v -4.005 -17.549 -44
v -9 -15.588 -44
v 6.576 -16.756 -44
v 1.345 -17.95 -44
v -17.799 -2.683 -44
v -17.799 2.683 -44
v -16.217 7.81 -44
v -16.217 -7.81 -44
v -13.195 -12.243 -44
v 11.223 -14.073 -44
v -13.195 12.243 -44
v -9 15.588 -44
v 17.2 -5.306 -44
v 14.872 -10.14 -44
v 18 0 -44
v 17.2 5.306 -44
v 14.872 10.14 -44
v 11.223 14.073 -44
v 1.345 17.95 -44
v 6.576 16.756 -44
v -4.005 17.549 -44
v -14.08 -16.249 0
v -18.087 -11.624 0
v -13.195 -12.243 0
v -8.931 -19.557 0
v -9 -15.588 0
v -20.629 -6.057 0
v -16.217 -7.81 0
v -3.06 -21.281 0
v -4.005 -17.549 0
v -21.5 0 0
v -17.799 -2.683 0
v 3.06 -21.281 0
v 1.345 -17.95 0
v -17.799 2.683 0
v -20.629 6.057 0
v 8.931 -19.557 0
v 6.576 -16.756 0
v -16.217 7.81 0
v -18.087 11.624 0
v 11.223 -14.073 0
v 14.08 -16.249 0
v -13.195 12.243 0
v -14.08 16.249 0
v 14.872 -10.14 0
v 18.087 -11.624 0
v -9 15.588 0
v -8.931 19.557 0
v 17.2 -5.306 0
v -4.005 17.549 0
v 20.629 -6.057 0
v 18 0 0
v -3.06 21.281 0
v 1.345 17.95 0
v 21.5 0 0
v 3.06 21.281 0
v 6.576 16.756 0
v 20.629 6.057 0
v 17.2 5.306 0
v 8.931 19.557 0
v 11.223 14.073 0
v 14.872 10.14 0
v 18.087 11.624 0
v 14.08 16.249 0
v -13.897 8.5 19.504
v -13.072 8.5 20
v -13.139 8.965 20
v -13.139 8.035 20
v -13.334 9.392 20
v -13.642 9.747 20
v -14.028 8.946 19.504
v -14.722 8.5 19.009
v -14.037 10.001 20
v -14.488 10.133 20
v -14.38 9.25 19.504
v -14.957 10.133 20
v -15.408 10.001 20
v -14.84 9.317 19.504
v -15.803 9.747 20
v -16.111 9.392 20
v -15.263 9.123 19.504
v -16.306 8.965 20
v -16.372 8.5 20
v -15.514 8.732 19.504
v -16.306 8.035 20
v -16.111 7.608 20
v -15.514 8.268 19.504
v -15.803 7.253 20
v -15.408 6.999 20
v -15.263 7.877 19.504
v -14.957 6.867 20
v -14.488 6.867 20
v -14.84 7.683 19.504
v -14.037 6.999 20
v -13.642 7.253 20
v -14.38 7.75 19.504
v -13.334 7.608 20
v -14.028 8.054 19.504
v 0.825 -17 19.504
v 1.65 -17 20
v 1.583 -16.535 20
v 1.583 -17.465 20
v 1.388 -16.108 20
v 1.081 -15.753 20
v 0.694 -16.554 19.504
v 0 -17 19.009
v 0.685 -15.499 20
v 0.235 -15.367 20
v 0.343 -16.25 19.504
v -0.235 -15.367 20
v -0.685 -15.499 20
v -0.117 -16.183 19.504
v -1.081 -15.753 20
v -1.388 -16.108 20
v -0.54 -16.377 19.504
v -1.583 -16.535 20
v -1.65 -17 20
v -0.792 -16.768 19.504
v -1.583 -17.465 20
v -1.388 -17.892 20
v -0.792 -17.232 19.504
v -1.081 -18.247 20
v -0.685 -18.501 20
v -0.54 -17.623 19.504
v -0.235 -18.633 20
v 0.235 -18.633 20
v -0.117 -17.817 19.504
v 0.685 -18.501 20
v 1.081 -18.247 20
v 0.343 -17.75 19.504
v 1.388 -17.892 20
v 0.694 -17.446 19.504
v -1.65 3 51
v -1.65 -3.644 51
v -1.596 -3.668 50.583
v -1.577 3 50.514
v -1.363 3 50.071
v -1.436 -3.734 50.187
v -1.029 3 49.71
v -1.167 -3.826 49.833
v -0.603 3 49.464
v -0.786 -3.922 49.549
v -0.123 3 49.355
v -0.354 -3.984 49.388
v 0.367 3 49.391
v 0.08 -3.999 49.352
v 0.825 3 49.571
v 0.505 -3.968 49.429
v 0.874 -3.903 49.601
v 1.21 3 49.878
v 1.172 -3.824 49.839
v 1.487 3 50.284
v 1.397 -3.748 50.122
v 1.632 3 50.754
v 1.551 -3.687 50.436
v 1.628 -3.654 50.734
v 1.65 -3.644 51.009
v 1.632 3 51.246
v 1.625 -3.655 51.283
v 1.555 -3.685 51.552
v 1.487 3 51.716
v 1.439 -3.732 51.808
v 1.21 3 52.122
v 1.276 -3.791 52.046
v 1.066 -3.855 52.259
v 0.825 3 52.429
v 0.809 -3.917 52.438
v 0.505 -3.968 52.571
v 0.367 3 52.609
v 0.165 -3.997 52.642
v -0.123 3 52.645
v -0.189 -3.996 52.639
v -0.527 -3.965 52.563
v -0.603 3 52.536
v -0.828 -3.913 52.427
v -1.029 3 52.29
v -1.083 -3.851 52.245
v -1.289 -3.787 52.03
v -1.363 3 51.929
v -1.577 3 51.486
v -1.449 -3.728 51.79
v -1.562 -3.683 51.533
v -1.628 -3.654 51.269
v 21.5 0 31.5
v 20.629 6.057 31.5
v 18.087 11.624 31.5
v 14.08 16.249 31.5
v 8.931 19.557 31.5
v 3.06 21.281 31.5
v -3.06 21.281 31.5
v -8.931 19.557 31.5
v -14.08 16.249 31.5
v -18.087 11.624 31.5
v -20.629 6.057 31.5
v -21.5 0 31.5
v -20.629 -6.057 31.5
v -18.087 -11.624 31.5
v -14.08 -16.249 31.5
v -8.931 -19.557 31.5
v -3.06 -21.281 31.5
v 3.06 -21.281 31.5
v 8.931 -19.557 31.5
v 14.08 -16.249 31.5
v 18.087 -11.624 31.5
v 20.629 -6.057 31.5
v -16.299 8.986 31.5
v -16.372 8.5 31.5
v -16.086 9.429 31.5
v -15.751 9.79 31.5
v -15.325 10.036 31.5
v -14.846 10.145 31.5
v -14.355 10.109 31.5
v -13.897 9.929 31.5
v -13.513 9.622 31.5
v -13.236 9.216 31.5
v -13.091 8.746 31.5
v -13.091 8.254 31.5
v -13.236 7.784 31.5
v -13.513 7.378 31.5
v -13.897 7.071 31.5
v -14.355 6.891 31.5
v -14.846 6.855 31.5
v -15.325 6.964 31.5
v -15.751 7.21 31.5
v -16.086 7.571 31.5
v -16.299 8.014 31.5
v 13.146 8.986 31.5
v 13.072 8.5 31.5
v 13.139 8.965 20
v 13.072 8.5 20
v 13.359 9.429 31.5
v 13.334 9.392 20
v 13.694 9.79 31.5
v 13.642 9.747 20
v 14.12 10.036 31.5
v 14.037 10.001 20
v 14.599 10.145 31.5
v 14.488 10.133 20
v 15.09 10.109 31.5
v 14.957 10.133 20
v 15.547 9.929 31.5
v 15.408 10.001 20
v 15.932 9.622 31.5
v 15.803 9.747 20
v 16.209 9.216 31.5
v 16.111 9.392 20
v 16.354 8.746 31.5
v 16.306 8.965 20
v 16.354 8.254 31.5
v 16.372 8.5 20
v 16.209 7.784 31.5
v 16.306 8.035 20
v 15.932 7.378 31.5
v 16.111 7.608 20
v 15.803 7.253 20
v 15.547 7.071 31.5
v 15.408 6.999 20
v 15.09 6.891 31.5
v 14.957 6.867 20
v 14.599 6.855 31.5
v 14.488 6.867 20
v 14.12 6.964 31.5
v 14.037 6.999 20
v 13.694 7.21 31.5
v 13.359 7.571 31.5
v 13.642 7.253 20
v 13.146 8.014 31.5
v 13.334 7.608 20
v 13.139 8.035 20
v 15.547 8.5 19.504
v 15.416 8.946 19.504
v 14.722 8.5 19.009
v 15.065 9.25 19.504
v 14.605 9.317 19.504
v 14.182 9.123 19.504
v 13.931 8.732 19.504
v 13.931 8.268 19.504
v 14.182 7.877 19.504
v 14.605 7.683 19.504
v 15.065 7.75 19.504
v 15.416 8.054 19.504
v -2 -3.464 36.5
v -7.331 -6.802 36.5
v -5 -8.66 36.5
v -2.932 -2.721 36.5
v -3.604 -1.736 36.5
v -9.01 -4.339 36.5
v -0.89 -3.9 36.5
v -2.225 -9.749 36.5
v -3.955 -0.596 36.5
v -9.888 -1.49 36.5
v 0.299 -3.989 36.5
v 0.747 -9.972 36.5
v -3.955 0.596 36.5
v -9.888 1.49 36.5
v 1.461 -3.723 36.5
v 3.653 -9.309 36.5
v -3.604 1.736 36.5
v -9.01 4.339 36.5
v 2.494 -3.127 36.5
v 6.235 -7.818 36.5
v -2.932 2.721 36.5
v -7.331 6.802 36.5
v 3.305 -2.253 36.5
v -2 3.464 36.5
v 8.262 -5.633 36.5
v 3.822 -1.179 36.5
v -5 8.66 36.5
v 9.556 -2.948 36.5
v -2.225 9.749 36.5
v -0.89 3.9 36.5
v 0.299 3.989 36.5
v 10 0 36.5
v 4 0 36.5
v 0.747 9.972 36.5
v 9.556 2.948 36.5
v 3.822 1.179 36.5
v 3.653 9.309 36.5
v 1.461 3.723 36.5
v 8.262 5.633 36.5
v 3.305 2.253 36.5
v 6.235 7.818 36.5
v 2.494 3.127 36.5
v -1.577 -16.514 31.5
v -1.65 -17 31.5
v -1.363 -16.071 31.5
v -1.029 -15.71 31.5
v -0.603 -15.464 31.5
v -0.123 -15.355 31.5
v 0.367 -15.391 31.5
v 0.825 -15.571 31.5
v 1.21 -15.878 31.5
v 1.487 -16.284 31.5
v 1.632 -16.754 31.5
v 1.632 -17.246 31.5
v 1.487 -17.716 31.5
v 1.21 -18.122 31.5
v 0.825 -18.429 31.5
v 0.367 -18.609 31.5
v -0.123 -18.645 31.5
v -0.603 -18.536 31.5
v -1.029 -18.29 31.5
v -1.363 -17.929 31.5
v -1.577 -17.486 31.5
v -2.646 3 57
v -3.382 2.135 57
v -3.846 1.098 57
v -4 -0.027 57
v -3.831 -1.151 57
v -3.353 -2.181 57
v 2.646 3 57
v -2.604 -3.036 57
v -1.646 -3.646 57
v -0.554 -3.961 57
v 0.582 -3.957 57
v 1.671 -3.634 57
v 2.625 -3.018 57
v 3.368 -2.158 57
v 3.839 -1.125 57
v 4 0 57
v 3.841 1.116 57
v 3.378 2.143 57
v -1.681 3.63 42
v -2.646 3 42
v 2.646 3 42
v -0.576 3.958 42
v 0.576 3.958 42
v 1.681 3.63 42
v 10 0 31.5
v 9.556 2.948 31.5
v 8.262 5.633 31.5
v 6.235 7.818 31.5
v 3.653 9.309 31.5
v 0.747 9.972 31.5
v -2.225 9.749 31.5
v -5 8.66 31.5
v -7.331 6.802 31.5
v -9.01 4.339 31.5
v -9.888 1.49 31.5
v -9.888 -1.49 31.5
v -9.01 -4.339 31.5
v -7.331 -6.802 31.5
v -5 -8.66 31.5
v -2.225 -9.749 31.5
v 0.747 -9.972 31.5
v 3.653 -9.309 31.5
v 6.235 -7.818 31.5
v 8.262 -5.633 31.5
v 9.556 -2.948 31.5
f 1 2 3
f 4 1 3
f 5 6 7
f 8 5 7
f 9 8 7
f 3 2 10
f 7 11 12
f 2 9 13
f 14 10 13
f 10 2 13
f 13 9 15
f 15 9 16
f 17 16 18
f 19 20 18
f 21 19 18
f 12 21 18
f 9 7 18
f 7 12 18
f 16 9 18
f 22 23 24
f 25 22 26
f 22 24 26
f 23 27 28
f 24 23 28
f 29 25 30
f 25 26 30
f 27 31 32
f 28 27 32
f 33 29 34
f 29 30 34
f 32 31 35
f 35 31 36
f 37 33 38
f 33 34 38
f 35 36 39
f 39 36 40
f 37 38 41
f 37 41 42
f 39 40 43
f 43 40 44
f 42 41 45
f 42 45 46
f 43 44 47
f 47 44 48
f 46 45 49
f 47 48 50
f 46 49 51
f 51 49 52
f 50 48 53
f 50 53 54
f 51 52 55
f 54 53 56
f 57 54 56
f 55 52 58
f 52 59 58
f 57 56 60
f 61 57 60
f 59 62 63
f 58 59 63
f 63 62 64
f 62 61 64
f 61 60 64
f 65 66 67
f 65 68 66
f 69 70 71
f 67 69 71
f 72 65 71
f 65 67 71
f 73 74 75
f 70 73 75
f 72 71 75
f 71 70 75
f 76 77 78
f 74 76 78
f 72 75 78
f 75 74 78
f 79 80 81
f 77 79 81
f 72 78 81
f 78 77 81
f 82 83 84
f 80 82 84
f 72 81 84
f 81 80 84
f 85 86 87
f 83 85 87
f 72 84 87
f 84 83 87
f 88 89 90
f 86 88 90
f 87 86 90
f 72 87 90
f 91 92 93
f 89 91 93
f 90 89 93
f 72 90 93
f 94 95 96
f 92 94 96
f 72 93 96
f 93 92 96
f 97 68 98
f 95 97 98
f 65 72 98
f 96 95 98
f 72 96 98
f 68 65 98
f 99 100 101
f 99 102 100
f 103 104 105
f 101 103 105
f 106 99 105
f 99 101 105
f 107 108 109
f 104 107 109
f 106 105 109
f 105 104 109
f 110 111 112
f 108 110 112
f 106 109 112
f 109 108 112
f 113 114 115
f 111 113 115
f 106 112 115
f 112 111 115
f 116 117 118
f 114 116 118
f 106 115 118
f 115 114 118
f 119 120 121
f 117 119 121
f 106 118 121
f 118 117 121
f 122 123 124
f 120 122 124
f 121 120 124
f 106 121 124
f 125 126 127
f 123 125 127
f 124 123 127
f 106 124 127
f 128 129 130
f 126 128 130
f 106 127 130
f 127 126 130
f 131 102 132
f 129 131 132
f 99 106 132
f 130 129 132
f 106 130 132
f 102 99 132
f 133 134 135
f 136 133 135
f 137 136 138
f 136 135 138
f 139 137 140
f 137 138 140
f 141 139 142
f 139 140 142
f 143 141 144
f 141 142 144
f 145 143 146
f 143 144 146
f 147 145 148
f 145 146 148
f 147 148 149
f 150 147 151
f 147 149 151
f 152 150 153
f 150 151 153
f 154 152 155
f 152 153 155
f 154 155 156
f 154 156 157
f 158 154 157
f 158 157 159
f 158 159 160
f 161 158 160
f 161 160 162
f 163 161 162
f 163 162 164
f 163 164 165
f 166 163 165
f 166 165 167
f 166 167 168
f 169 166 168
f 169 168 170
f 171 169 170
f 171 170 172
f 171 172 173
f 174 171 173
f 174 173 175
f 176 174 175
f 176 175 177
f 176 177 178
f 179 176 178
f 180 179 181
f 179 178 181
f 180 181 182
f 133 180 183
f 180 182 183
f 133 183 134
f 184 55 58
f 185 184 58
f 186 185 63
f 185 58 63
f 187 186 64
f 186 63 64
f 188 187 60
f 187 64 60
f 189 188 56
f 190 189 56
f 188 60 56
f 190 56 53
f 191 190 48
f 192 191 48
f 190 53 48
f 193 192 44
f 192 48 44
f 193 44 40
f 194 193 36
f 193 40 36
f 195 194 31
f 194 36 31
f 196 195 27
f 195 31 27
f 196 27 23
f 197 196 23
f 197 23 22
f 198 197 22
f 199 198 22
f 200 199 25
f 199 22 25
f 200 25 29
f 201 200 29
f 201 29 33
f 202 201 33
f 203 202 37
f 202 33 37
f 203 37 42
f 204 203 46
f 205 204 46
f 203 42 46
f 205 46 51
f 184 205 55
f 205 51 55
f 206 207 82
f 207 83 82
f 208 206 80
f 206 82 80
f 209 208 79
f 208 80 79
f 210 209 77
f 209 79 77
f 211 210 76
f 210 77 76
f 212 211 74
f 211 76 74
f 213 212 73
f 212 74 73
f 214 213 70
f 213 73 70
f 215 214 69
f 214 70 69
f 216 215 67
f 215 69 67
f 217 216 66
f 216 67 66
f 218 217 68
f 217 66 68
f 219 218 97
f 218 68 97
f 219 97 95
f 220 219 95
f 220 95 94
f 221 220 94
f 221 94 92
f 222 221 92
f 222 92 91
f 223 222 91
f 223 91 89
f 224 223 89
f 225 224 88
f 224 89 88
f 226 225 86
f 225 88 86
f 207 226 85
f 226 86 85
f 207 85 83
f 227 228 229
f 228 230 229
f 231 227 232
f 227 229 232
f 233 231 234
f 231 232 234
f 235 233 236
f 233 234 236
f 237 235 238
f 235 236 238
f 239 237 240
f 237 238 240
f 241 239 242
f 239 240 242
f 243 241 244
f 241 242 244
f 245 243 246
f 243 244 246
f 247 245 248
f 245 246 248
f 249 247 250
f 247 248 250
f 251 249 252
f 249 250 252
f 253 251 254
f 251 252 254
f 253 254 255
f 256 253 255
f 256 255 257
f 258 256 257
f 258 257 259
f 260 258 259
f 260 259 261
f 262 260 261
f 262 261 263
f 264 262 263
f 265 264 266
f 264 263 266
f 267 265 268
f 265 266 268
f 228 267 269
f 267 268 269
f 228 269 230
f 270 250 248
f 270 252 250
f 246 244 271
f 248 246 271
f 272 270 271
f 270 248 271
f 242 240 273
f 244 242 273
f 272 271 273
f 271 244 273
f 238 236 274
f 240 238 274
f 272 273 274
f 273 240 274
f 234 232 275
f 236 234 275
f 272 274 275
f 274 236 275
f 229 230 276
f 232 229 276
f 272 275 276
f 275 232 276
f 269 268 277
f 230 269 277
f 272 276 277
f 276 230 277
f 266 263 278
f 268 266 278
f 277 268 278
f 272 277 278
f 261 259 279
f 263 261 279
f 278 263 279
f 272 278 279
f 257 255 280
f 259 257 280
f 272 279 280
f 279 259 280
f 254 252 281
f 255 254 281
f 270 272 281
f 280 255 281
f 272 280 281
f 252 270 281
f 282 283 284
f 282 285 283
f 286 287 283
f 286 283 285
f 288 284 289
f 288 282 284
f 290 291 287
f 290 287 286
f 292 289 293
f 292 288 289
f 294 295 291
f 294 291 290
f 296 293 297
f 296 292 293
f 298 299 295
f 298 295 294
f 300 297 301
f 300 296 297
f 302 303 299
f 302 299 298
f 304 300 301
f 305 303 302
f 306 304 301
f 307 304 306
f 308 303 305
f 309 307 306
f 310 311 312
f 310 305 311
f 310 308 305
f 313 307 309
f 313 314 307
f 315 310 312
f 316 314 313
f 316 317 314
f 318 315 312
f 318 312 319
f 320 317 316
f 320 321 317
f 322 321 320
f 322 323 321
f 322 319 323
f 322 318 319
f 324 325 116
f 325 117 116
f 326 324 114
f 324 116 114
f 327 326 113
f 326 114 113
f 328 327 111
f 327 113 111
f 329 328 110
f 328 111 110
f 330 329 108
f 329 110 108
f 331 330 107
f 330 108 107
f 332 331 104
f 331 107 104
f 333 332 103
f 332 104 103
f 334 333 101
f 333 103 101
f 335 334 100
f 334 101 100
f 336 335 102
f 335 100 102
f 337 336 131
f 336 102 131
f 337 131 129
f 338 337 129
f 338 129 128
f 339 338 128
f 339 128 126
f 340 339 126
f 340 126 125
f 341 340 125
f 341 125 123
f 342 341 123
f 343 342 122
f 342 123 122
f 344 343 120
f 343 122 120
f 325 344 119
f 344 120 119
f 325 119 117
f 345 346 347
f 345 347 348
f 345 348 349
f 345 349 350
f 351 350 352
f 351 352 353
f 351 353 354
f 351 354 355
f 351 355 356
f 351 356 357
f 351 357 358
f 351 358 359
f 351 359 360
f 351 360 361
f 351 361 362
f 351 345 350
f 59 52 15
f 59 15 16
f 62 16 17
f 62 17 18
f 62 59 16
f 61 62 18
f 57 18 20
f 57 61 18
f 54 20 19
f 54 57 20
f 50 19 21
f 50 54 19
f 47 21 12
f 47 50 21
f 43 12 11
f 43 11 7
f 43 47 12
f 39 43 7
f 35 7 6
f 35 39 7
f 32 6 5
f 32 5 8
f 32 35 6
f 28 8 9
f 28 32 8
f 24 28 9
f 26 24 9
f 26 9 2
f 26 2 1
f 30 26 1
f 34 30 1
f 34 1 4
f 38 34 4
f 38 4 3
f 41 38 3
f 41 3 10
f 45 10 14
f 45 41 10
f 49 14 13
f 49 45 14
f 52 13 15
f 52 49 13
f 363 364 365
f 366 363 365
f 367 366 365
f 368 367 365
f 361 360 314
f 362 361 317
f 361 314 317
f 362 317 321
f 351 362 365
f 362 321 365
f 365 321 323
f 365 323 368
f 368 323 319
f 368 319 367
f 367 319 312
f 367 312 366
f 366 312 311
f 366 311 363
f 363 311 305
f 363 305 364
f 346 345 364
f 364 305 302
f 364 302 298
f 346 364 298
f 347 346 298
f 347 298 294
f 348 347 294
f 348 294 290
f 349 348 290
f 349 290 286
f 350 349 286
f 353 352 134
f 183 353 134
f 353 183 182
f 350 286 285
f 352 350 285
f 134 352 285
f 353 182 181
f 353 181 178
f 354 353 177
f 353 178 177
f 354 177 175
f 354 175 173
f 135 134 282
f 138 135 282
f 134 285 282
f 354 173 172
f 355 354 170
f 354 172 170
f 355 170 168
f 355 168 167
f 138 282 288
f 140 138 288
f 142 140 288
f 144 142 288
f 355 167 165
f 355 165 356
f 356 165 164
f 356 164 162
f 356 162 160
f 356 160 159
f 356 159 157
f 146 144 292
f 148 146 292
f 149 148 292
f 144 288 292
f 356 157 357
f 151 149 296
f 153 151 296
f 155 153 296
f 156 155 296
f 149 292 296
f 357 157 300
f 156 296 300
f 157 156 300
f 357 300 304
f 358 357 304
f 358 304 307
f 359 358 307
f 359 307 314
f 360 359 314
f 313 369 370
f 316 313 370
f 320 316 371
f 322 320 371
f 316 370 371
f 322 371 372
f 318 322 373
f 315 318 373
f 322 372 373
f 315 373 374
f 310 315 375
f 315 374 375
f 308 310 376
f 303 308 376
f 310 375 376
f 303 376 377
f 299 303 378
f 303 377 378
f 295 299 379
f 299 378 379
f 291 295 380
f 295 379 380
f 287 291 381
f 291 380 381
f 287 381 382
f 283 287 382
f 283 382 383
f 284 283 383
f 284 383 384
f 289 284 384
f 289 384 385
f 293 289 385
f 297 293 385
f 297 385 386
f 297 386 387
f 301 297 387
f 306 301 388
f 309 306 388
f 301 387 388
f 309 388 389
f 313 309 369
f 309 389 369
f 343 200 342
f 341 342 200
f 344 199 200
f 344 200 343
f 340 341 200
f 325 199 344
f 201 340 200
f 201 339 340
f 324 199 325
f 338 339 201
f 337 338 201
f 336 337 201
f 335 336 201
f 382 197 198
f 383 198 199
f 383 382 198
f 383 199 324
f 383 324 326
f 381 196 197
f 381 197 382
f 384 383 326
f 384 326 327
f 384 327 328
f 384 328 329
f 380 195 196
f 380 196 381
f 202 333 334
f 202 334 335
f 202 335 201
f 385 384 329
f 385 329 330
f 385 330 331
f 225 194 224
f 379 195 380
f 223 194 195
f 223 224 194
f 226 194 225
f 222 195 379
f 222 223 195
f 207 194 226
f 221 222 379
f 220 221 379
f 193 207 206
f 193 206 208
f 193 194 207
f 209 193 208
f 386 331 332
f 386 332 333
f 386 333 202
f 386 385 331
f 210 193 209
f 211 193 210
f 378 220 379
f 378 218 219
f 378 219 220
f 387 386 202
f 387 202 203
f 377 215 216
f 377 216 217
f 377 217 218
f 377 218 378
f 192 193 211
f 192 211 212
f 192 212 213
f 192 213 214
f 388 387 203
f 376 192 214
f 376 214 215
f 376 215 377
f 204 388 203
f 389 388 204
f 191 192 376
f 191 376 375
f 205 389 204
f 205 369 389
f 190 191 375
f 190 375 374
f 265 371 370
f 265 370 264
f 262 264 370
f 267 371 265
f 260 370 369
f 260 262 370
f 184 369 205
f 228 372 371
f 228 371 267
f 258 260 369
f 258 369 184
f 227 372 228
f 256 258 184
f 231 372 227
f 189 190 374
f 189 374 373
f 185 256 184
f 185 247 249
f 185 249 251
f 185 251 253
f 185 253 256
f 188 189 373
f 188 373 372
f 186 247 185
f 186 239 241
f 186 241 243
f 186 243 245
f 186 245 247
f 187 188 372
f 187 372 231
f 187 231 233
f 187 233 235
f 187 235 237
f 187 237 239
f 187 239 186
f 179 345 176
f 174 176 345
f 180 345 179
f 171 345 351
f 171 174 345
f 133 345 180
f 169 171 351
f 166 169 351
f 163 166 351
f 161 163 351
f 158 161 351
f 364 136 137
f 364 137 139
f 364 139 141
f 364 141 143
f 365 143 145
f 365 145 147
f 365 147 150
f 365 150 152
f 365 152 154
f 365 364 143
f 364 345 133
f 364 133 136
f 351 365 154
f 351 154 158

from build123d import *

# Parameters (mm, degrees)
SKETCH_1_R          = 21.5
SKETCH_1_R_2        = 18
EXTRUDE_1_DEPTH     = 31.5
SKETCH_1_3_R        = 18
EXTRUDE_2_DEPTH     = 44
SKETCH_2_R          = 10
SKETCH_2_R_2        = 4
EXTRUDE_3_DEPTH     = 5
SKETCH_2_2_R        = 4
EXTRUDE_4_DEPTH     = 25.5
CUT_EXTRUDE_START   = 3
SKETCH_3_W          = 15.90617044
SKETCH_3_H          = 15
CUT_EXTRUDE_1_DEPTH = 62.602631525
M4X0_7_1_D          = 3.3
M4X0_7_1_DEPTH      = 11.5
M4X0_7_1_TIP        = 0.991420021
M4X0_7_2_D          = 3.3


with BuildPart() as part:
    # ｽｹｯﾁ1 → ﾎﾞｽ - 押し出し1 (new body)
    with BuildSketch(Plane.XY):
        Circle(SKETCH_1_R)
        Circle(SKETCH_1_R_2, mode=Mode.SUBTRACT)
        Circle(SKETCH_1_R_2)
    extrude(amount=EXTRUDE_1_DEPTH)

    # ｽｹｯﾁ1<3> → ﾎﾞｽ - 押し出し2 (add)
    with BuildSketch(Plane.XY):
        Circle(SKETCH_1_3_R)
    extrude(amount=-EXTRUDE_2_DEPTH)

    # ｽｹｯﾁ2 → ﾎﾞｽ - 押し出し3 (add)
    with BuildSketch(Plane.XY.offset(31.5)):
        Circle(SKETCH_2_R)
        Circle(SKETCH_2_R_2, mode=Mode.SUBTRACT)
    extrude(amount=EXTRUDE_3_DEPTH)

    # ｽｹｯﾁ2<2> → ﾎﾞｽ - 押し出し4 (add)
    with BuildSketch(Plane.XY.offset(31.5)):
        Circle(SKETCH_2_2_R)
    extrude(amount=EXTRUDE_4_DEPTH)

    # ｽｹｯﾁ3 → ｶｯﾄ - 押し出し1 (cut, through all)
    with BuildSketch(Plane(origin=(0, 0, 0), x_dir=(1, 0, 0), z_dir=(0, 1, 0)).offset(CUT_EXTRUDE_START)):
        with Locations((0, -49.5)):
            Rectangle(SKETCH_3_W, SKETCH_3_H)
    extrude(amount=CUT_EXTRUDE_1_DEPTH, mode=Mode.SUBTRACT)

    # M4x0.7 ねじ穴1
    with Locations(Plane.XY.offset(31.5)):
        with Locations((0, -17), (-14.722431864, 8.5), (14.722431864, 8.5)):
            Hole(M4X0_7_1_D / 2, depth=M4X0_7_1_DEPTH)
            with Locations((0, 0, -(M4X0_7_1_DEPTH + M4X0_7_1_TIP / 2))):  # 118° drill point
                Cone(0, M4X0_7_1_D / 2, M4X0_7_1_TIP, mode=Mode.SUBTRACT)

    # M4x0.7 ねじ穴2 (through all)
    with Locations(Plane(origin=(0, 3, 0), x_dir=(1, 0, 0), z_dir=(0, 1, 0))):
        with Locations((0, -51)):
            Hole(M4X0_7_2_D / 2)


solid = part.part
